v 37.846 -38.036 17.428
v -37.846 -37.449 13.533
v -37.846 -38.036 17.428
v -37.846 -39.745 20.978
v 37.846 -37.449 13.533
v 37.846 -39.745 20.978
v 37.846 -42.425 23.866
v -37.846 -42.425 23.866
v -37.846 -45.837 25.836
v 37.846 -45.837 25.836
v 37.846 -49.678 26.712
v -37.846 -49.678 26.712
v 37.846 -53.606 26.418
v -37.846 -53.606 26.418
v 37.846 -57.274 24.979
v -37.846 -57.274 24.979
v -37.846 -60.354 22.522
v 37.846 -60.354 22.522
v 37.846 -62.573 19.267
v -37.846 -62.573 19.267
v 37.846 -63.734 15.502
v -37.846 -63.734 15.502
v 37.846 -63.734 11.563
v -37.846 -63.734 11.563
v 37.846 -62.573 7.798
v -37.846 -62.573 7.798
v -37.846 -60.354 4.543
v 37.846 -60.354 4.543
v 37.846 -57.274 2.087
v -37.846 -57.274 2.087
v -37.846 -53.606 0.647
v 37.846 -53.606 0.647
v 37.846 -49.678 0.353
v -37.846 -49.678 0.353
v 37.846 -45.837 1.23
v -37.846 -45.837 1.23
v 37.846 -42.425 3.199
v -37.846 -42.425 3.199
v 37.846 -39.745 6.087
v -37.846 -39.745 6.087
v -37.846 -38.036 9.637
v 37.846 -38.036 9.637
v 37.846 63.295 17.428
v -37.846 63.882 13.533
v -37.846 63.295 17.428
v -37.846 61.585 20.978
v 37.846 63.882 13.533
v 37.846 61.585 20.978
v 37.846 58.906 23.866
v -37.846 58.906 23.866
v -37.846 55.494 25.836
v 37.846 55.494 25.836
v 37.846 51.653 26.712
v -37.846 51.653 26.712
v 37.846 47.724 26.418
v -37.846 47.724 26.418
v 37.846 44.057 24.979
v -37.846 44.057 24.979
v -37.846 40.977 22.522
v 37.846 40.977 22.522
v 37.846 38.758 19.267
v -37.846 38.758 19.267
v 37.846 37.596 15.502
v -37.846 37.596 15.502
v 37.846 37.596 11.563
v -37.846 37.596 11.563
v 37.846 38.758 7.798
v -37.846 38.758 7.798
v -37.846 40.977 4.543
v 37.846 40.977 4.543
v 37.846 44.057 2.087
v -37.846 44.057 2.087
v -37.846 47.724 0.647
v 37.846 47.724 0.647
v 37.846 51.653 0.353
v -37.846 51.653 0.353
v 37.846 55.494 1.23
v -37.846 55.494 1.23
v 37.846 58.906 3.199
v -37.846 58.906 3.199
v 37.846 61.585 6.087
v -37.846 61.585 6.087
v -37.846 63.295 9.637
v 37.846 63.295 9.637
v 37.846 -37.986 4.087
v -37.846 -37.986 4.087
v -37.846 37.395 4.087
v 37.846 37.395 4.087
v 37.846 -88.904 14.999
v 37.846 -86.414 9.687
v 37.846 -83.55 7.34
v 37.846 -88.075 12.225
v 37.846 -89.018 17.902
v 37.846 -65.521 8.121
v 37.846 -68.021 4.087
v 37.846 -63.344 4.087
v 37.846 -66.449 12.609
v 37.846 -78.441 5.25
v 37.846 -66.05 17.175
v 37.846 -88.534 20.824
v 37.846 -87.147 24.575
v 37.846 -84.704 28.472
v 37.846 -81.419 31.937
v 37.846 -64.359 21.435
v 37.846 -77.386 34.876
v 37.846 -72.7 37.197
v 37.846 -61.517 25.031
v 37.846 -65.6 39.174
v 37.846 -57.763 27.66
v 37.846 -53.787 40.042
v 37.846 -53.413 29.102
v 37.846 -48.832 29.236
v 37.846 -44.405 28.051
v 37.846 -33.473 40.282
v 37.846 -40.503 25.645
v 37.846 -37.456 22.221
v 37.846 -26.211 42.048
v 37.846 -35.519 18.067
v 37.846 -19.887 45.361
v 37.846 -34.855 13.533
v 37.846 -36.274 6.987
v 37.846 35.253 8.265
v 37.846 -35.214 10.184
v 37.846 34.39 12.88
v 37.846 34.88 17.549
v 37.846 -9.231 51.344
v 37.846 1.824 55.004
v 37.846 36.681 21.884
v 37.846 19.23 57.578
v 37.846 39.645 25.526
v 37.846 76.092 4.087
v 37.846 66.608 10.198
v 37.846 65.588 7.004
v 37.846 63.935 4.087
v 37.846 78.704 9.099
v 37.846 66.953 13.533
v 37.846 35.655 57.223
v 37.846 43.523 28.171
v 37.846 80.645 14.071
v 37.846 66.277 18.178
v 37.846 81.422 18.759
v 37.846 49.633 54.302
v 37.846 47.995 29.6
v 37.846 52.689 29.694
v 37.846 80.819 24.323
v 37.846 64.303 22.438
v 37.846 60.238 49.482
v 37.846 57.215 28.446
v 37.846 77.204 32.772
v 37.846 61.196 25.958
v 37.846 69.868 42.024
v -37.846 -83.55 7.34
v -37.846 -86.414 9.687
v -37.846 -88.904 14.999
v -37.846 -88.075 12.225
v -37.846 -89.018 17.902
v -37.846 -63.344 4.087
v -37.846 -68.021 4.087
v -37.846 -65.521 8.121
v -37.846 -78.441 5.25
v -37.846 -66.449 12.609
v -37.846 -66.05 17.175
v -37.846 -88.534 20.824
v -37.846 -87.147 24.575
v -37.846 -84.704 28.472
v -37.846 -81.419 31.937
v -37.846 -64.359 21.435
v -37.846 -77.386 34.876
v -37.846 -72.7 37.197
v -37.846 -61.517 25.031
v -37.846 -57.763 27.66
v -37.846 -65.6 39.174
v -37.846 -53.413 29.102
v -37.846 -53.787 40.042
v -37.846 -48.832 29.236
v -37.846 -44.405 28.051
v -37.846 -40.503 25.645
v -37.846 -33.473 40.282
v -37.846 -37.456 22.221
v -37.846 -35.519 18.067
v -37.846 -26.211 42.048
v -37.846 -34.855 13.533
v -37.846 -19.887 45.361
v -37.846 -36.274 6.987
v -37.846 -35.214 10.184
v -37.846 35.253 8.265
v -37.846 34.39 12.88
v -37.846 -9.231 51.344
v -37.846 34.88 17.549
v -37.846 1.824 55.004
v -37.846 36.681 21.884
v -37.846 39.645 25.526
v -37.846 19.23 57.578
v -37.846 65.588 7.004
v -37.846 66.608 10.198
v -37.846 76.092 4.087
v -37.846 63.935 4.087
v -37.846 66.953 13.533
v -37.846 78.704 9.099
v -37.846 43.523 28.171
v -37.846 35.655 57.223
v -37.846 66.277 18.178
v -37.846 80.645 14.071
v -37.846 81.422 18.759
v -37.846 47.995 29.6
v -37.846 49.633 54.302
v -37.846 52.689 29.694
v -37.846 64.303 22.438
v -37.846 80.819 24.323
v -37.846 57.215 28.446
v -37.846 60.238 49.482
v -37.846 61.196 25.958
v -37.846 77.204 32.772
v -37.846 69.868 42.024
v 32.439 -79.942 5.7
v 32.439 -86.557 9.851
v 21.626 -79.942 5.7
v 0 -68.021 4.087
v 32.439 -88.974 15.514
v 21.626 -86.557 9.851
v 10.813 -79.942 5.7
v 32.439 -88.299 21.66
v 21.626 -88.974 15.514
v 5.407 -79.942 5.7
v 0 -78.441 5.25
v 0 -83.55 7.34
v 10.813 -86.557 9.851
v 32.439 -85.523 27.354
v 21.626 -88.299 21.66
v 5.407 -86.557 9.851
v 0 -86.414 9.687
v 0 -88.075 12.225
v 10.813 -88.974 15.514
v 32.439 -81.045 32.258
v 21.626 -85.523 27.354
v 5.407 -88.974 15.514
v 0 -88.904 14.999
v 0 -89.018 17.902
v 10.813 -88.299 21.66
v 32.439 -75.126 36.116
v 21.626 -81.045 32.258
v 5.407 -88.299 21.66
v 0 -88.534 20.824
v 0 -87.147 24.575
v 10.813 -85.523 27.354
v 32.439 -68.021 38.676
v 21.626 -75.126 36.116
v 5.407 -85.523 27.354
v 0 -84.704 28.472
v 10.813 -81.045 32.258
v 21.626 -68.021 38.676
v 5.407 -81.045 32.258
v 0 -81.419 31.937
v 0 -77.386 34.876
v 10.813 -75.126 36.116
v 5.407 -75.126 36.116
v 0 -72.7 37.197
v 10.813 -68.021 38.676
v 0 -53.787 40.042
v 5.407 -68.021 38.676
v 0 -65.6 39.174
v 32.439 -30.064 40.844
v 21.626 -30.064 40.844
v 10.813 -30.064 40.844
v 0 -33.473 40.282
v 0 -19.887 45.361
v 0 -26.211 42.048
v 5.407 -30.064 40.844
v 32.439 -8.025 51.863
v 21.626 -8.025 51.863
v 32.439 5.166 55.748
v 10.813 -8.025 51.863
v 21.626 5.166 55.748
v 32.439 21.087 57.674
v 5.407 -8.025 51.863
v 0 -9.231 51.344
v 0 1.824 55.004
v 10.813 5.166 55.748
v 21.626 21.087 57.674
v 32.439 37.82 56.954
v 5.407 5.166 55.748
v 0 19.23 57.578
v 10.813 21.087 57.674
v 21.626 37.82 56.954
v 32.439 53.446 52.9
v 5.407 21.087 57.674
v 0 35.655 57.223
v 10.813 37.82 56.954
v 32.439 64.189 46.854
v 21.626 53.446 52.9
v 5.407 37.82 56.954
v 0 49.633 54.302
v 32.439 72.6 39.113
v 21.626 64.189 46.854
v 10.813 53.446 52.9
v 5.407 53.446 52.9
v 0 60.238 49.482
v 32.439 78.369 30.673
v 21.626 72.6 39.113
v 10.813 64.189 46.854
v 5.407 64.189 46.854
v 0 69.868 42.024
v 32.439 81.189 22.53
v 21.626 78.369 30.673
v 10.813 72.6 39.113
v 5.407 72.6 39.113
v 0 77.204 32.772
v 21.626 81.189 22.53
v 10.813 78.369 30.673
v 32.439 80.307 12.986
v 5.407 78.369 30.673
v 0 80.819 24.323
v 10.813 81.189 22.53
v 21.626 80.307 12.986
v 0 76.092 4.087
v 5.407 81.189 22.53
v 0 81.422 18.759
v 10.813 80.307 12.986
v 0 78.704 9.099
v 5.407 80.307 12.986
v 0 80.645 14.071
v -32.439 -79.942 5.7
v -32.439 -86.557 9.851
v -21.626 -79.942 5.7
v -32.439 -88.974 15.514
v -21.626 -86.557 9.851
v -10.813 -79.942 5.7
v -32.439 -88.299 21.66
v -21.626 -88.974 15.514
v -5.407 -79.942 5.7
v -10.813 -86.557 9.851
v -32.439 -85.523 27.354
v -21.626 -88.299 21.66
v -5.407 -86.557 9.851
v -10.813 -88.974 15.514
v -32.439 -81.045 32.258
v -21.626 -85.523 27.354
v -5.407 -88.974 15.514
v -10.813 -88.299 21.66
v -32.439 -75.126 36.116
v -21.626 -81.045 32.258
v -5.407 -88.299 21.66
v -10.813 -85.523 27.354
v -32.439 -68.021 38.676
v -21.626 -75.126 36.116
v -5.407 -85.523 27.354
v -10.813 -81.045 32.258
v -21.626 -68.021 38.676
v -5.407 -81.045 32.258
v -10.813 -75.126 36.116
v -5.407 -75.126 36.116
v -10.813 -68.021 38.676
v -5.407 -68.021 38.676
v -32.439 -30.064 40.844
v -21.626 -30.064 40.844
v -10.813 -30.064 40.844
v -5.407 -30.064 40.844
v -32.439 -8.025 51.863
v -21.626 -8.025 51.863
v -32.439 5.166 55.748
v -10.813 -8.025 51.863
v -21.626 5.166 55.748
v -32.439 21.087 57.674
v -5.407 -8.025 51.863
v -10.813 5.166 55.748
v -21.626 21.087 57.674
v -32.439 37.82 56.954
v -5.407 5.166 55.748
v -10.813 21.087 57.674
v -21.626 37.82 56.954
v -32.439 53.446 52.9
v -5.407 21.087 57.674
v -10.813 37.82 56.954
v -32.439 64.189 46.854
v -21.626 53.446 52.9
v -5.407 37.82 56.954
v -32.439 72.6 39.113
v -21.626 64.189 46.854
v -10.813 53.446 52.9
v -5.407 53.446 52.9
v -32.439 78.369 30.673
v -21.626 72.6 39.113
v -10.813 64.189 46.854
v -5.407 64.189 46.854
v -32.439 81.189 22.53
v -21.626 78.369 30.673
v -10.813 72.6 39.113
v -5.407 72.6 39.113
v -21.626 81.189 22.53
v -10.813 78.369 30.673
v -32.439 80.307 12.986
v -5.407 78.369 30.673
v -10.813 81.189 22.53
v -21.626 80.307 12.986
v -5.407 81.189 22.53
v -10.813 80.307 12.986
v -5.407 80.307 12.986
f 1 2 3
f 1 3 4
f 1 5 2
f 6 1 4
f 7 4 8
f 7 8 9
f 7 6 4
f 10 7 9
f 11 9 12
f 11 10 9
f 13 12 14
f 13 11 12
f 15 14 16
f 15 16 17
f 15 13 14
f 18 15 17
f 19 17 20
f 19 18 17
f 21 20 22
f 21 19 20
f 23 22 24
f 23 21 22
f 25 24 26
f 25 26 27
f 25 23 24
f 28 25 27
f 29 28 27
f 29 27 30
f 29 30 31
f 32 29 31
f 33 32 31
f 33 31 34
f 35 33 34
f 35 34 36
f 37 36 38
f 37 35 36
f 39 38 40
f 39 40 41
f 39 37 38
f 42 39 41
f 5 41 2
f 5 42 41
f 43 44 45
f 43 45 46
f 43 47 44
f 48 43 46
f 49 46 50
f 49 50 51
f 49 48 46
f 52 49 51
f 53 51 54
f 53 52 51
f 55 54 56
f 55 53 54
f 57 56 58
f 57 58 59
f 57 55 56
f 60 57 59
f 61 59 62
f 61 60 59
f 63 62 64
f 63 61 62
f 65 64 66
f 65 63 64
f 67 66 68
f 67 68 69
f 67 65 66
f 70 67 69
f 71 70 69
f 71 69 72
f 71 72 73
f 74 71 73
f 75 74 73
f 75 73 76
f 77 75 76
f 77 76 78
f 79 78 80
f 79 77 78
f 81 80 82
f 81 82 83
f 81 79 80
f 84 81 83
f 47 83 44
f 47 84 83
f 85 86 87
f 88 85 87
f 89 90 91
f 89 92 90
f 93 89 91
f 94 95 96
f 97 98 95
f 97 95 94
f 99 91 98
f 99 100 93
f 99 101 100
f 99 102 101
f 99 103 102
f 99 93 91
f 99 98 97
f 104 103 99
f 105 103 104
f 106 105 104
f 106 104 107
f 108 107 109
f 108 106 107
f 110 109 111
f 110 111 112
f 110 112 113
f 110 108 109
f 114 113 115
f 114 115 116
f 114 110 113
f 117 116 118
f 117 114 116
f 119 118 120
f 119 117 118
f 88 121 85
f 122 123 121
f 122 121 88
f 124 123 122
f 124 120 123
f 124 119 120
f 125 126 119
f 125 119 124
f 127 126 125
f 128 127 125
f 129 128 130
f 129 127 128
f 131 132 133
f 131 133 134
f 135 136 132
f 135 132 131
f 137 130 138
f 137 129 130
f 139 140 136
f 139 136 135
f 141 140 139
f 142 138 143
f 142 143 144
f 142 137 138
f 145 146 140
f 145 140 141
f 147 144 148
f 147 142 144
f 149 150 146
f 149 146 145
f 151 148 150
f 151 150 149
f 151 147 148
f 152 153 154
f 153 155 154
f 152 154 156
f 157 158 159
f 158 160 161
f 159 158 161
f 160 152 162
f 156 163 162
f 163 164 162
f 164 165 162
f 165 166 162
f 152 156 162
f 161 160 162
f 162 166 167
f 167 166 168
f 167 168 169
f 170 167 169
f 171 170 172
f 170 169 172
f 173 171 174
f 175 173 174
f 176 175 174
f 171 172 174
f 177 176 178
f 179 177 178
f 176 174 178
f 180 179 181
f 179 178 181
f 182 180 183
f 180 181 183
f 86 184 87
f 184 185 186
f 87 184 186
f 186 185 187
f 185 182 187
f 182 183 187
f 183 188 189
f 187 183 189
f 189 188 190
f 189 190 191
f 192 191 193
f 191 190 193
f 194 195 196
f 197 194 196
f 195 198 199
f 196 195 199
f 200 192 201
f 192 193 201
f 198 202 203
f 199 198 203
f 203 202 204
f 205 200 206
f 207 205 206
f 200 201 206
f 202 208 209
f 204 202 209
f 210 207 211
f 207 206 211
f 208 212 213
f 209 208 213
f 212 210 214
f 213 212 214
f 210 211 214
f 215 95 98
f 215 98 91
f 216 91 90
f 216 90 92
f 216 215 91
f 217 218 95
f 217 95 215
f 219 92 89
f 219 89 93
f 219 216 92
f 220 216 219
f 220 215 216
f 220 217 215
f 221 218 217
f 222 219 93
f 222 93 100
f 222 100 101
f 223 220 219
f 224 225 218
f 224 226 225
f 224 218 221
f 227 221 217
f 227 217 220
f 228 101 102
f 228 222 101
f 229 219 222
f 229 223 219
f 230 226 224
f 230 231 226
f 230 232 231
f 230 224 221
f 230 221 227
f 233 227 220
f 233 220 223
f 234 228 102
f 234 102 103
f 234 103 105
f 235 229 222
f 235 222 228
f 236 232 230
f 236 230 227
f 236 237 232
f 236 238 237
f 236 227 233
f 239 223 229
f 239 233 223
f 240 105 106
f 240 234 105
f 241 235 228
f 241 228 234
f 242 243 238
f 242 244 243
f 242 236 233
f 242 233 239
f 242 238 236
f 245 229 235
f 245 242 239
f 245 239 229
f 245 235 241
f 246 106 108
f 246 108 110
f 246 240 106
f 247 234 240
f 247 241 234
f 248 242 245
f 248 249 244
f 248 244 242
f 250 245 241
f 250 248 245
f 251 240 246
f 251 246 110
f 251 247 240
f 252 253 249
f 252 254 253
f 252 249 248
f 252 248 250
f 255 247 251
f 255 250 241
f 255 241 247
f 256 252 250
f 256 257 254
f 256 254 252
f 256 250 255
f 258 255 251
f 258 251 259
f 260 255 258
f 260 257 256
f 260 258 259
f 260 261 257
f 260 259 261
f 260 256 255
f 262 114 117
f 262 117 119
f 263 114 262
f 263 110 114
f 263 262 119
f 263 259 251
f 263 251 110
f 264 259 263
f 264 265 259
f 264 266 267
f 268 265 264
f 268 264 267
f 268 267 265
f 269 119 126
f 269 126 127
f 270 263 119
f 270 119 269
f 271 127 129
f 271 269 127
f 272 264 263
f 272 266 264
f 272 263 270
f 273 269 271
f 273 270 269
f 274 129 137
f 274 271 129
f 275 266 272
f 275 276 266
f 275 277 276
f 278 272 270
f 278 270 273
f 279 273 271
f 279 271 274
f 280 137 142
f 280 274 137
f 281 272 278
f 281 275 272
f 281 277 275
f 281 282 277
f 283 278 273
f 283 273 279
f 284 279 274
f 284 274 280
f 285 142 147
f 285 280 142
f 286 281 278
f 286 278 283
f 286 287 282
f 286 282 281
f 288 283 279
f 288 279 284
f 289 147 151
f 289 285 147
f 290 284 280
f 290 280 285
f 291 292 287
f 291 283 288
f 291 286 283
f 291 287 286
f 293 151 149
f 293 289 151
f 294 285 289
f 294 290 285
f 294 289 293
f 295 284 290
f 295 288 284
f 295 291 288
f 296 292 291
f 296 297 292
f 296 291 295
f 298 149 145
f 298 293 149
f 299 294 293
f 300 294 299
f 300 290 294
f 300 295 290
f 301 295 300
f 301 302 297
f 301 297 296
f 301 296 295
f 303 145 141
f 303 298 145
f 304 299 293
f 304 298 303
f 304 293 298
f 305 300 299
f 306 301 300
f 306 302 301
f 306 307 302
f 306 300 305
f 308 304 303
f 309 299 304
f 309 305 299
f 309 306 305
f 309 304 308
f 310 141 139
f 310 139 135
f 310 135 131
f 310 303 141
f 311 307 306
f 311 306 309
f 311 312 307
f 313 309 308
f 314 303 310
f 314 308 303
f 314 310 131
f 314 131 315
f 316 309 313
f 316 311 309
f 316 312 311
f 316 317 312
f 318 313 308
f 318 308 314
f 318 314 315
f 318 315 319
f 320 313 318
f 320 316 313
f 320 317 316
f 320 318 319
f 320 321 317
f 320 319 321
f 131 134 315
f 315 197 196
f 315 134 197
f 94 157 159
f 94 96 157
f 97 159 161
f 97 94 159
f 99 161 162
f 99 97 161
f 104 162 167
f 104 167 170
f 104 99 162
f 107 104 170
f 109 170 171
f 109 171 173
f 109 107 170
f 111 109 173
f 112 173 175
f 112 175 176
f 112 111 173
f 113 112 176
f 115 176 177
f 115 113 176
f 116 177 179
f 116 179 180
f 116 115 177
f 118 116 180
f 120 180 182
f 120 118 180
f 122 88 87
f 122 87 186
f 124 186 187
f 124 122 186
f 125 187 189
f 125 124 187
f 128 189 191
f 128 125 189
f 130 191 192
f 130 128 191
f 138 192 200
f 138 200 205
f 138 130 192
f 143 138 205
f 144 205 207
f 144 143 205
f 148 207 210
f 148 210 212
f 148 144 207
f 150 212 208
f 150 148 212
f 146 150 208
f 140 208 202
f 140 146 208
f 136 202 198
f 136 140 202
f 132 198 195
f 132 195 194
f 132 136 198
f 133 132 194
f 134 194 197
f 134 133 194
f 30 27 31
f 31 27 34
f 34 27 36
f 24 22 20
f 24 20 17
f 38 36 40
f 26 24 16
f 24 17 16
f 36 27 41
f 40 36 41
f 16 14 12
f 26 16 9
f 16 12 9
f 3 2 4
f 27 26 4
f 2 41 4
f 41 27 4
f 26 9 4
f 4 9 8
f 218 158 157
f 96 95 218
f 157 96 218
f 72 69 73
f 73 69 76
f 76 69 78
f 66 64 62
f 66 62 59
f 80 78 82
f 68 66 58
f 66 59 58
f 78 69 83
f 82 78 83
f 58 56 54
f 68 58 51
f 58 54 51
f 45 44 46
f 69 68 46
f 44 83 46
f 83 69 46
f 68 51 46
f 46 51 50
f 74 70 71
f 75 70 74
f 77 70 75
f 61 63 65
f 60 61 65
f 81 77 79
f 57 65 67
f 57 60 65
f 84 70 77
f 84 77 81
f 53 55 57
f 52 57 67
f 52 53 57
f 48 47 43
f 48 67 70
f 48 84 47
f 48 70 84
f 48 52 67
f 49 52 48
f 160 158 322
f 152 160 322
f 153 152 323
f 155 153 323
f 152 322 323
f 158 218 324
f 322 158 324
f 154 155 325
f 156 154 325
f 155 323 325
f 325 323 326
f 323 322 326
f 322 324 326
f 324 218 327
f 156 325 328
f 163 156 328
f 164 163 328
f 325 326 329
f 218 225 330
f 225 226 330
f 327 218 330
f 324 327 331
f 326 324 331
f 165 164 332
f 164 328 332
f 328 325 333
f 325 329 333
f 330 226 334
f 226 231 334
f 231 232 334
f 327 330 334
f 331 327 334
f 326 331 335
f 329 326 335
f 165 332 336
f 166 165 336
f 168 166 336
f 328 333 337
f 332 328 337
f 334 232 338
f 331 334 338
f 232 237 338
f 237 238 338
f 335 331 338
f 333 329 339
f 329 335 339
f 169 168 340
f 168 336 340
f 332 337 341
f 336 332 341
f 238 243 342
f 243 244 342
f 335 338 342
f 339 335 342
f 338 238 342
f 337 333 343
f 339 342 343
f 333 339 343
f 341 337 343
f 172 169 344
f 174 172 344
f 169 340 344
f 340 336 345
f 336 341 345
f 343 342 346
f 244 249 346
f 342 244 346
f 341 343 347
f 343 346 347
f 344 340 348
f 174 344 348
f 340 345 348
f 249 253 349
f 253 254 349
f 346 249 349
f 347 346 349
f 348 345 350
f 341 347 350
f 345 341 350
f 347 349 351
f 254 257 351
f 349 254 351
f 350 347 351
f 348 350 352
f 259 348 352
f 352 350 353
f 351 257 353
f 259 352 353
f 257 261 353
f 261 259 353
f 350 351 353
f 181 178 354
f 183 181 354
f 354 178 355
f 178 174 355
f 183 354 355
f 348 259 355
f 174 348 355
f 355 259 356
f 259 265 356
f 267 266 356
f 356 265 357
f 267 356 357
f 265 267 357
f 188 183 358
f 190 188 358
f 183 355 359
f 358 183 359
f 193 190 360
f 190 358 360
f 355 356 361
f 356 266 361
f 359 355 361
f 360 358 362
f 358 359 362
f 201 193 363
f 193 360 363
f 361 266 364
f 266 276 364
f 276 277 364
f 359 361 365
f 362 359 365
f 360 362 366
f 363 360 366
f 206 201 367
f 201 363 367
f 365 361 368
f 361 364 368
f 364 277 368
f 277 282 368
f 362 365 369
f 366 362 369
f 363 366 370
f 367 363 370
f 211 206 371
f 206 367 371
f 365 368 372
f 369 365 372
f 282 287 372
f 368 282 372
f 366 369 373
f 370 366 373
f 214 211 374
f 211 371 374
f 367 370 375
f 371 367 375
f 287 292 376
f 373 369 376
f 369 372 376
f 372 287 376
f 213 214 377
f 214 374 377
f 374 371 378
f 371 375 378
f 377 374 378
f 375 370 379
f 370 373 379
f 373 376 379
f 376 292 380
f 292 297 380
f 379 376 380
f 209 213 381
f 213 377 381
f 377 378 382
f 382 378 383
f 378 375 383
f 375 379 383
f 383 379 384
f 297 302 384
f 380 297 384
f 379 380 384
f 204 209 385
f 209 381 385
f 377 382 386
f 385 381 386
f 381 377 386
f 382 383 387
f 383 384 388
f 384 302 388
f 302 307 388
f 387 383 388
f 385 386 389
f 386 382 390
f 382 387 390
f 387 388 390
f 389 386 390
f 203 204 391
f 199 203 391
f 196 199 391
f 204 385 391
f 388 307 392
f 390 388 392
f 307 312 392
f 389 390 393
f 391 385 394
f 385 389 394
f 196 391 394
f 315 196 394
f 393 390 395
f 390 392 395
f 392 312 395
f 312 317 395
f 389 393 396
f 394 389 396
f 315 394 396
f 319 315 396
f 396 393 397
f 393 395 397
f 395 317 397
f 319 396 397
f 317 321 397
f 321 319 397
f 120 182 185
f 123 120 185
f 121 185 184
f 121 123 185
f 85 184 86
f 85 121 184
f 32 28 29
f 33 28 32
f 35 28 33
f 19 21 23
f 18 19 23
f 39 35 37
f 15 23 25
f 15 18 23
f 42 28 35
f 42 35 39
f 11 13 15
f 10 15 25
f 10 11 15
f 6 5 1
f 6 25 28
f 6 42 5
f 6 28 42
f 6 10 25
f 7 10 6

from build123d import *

# Parameters (mm, degrees)
F0_R     = 13.216614321
F1_DEPTH = 37.846


with BuildPart() as f1:
    # F0 (on Right) → F1 (new body, symmetric)
    with BuildSketch(Plane.YZ):
        with Locations((-50.6653307866, 13.5326530386)):
            Circle(F0_R)
    extrude(amount=F1_DEPTH, both=True)


with BuildPart() as f1b:
    # F0 (on Right) → F1, piece 2 (new body, symmetric)
    with BuildSketch(Plane.YZ):
        with Locations((50.6653307866, 13.5326530386)):
            Circle(F0_R)
    extrude(amount=F1_DEPTH, both=True)


with BuildPart() as f1c:
    # F0 (on Right) → F1, piece 3 (new body, symmetric)
    with BuildSketch(Plane.YZ):
        with BuildLine():
            ThreePointArc((-63.344253716, 4.0874228362), (-55.6407269298, 28.5397478089), (-34.8549715172, 13.5326530386))
            ThreePointArc((-34.8549715172, 13.5326530386), (-35.6582360163, 8.5572568954), (-37.9864078571, 4.0874228362))
            Line((-37.9864078571, 4.0874228362), (37.395499757, 4.0874228362))
            ThreePointArc((37.395499757, 4.0874228362), (45.707456761, 29.0478157602), (66.9533874273, 13.5326530386))
            ThreePointArc((66.9533874273, 13.5326530386), (66.1804935081, 8.574779013), (63.9351618162, 4.0874228362))
            Line((63.9351618162, 4.0874228362), (76.0923872439, 4.0874228362))
            add(Edge.make_bspline(
                [(-68.0214359061, 4.0874228362), (-87.9431305315, 4.0874228362), (-93.5747225099, 23.0474680653), (-68.9686816123, 44.1207693106), (-27.5033923902, 36.1284762743), (-10.3980912607, 56.2776935532), (56.5401787407, 63.1155509197), (86.5888672318, 23.4281355947), (79.4066745998, 10.1955566569), (76.0923872439, 4.0874228362)],
                knots=[0, 0, 0, 0, 0.1292301403, 0.2575864603, 0.4114148648, 0.5352528053, 0.730866763, 0.8908733985, 1, 1, 1, 1], degree=3))
            Line((-68.0214359061, 4.0874228362), (-63.344253716, 4.0874228362))
        make_face()
    extrude(amount=F1_DEPTH, both=True)


solid = Compound([f1.part, f1b.part, f1c.part])
